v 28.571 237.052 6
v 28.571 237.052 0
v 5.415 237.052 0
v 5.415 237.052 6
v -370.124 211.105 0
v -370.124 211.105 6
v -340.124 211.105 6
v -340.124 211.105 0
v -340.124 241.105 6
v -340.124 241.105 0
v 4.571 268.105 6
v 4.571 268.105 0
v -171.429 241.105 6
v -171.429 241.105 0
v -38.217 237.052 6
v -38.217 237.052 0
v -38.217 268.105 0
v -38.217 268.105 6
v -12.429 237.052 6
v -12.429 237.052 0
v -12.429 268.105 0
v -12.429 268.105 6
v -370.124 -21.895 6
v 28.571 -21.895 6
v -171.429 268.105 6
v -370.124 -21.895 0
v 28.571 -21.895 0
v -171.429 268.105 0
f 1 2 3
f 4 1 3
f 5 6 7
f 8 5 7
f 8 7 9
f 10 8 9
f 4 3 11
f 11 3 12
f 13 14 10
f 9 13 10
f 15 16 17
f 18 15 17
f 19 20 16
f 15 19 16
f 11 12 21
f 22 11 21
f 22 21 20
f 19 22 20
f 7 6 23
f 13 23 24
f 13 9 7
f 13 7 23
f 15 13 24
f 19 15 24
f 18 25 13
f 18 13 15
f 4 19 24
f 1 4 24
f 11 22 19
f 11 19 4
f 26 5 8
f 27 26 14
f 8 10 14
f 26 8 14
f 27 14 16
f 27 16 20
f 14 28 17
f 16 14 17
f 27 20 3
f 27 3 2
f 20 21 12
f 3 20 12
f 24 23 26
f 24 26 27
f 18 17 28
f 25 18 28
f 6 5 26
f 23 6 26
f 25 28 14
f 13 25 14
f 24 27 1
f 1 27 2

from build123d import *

# Parameters (mm, degrees)
BOSS_EXTRUDE1_DEPTH = 6
SKETCH2_W           = 30
SKETCH2_H           = 30
CUT_EXTRUDE1_DEPTH  = 10
SKETCH3_W           = 398.694966145
SKETCH3_H           = 1
CUT_EXTRUDE2_DEPTH  = 10


with BuildPart() as part:
    # Sketch1 → Boss-Extrude1 (new body)
    with BuildSketch(Plane.XY):
        Polygon((28.571428571, 236.060202245), (28.571428571, 237.05184048), (5.415486436, 237.05184048), (4.571428571, 268.104761905), (-12.428571429, 268.104761905), (-12.428571429, 237.05184048), (-38.216595912, 237.05184048), (-38.216595912, 268.104761905), (-171.428571429, 268.104761905), (-171.428571429, 241.104761905), (-370.123537574, 241.104761905), (-370.123537574, -22.895238095), (28.571428571, -22.895238095), align=None)
    extrude(amount=BOSS_EXTRUDE1_DEPTH)

    # Sketch2 → Cut-Extrude1 (cut)
    with BuildSketch(Plane.XY.offset(6)):
        with Locations((-355.123537574, 226.104761905)):
            Rectangle(SKETCH2_W, SKETCH2_H)
    extrude(amount=-CUT_EXTRUDE1_DEPTH, mode=Mode.SUBTRACT)

    # Sketch3 → Cut-Extrude2 (cut)
    with BuildSketch(Plane.XY.offset(6)):
        with Locations((-170.776054501, -22.395238095)):
            Rectangle(SKETCH3_W, SKETCH3_H)
    extrude(amount=-CUT_EXTRUDE2_DEPTH, mode=Mode.SUBTRACT)


solid = part.part
